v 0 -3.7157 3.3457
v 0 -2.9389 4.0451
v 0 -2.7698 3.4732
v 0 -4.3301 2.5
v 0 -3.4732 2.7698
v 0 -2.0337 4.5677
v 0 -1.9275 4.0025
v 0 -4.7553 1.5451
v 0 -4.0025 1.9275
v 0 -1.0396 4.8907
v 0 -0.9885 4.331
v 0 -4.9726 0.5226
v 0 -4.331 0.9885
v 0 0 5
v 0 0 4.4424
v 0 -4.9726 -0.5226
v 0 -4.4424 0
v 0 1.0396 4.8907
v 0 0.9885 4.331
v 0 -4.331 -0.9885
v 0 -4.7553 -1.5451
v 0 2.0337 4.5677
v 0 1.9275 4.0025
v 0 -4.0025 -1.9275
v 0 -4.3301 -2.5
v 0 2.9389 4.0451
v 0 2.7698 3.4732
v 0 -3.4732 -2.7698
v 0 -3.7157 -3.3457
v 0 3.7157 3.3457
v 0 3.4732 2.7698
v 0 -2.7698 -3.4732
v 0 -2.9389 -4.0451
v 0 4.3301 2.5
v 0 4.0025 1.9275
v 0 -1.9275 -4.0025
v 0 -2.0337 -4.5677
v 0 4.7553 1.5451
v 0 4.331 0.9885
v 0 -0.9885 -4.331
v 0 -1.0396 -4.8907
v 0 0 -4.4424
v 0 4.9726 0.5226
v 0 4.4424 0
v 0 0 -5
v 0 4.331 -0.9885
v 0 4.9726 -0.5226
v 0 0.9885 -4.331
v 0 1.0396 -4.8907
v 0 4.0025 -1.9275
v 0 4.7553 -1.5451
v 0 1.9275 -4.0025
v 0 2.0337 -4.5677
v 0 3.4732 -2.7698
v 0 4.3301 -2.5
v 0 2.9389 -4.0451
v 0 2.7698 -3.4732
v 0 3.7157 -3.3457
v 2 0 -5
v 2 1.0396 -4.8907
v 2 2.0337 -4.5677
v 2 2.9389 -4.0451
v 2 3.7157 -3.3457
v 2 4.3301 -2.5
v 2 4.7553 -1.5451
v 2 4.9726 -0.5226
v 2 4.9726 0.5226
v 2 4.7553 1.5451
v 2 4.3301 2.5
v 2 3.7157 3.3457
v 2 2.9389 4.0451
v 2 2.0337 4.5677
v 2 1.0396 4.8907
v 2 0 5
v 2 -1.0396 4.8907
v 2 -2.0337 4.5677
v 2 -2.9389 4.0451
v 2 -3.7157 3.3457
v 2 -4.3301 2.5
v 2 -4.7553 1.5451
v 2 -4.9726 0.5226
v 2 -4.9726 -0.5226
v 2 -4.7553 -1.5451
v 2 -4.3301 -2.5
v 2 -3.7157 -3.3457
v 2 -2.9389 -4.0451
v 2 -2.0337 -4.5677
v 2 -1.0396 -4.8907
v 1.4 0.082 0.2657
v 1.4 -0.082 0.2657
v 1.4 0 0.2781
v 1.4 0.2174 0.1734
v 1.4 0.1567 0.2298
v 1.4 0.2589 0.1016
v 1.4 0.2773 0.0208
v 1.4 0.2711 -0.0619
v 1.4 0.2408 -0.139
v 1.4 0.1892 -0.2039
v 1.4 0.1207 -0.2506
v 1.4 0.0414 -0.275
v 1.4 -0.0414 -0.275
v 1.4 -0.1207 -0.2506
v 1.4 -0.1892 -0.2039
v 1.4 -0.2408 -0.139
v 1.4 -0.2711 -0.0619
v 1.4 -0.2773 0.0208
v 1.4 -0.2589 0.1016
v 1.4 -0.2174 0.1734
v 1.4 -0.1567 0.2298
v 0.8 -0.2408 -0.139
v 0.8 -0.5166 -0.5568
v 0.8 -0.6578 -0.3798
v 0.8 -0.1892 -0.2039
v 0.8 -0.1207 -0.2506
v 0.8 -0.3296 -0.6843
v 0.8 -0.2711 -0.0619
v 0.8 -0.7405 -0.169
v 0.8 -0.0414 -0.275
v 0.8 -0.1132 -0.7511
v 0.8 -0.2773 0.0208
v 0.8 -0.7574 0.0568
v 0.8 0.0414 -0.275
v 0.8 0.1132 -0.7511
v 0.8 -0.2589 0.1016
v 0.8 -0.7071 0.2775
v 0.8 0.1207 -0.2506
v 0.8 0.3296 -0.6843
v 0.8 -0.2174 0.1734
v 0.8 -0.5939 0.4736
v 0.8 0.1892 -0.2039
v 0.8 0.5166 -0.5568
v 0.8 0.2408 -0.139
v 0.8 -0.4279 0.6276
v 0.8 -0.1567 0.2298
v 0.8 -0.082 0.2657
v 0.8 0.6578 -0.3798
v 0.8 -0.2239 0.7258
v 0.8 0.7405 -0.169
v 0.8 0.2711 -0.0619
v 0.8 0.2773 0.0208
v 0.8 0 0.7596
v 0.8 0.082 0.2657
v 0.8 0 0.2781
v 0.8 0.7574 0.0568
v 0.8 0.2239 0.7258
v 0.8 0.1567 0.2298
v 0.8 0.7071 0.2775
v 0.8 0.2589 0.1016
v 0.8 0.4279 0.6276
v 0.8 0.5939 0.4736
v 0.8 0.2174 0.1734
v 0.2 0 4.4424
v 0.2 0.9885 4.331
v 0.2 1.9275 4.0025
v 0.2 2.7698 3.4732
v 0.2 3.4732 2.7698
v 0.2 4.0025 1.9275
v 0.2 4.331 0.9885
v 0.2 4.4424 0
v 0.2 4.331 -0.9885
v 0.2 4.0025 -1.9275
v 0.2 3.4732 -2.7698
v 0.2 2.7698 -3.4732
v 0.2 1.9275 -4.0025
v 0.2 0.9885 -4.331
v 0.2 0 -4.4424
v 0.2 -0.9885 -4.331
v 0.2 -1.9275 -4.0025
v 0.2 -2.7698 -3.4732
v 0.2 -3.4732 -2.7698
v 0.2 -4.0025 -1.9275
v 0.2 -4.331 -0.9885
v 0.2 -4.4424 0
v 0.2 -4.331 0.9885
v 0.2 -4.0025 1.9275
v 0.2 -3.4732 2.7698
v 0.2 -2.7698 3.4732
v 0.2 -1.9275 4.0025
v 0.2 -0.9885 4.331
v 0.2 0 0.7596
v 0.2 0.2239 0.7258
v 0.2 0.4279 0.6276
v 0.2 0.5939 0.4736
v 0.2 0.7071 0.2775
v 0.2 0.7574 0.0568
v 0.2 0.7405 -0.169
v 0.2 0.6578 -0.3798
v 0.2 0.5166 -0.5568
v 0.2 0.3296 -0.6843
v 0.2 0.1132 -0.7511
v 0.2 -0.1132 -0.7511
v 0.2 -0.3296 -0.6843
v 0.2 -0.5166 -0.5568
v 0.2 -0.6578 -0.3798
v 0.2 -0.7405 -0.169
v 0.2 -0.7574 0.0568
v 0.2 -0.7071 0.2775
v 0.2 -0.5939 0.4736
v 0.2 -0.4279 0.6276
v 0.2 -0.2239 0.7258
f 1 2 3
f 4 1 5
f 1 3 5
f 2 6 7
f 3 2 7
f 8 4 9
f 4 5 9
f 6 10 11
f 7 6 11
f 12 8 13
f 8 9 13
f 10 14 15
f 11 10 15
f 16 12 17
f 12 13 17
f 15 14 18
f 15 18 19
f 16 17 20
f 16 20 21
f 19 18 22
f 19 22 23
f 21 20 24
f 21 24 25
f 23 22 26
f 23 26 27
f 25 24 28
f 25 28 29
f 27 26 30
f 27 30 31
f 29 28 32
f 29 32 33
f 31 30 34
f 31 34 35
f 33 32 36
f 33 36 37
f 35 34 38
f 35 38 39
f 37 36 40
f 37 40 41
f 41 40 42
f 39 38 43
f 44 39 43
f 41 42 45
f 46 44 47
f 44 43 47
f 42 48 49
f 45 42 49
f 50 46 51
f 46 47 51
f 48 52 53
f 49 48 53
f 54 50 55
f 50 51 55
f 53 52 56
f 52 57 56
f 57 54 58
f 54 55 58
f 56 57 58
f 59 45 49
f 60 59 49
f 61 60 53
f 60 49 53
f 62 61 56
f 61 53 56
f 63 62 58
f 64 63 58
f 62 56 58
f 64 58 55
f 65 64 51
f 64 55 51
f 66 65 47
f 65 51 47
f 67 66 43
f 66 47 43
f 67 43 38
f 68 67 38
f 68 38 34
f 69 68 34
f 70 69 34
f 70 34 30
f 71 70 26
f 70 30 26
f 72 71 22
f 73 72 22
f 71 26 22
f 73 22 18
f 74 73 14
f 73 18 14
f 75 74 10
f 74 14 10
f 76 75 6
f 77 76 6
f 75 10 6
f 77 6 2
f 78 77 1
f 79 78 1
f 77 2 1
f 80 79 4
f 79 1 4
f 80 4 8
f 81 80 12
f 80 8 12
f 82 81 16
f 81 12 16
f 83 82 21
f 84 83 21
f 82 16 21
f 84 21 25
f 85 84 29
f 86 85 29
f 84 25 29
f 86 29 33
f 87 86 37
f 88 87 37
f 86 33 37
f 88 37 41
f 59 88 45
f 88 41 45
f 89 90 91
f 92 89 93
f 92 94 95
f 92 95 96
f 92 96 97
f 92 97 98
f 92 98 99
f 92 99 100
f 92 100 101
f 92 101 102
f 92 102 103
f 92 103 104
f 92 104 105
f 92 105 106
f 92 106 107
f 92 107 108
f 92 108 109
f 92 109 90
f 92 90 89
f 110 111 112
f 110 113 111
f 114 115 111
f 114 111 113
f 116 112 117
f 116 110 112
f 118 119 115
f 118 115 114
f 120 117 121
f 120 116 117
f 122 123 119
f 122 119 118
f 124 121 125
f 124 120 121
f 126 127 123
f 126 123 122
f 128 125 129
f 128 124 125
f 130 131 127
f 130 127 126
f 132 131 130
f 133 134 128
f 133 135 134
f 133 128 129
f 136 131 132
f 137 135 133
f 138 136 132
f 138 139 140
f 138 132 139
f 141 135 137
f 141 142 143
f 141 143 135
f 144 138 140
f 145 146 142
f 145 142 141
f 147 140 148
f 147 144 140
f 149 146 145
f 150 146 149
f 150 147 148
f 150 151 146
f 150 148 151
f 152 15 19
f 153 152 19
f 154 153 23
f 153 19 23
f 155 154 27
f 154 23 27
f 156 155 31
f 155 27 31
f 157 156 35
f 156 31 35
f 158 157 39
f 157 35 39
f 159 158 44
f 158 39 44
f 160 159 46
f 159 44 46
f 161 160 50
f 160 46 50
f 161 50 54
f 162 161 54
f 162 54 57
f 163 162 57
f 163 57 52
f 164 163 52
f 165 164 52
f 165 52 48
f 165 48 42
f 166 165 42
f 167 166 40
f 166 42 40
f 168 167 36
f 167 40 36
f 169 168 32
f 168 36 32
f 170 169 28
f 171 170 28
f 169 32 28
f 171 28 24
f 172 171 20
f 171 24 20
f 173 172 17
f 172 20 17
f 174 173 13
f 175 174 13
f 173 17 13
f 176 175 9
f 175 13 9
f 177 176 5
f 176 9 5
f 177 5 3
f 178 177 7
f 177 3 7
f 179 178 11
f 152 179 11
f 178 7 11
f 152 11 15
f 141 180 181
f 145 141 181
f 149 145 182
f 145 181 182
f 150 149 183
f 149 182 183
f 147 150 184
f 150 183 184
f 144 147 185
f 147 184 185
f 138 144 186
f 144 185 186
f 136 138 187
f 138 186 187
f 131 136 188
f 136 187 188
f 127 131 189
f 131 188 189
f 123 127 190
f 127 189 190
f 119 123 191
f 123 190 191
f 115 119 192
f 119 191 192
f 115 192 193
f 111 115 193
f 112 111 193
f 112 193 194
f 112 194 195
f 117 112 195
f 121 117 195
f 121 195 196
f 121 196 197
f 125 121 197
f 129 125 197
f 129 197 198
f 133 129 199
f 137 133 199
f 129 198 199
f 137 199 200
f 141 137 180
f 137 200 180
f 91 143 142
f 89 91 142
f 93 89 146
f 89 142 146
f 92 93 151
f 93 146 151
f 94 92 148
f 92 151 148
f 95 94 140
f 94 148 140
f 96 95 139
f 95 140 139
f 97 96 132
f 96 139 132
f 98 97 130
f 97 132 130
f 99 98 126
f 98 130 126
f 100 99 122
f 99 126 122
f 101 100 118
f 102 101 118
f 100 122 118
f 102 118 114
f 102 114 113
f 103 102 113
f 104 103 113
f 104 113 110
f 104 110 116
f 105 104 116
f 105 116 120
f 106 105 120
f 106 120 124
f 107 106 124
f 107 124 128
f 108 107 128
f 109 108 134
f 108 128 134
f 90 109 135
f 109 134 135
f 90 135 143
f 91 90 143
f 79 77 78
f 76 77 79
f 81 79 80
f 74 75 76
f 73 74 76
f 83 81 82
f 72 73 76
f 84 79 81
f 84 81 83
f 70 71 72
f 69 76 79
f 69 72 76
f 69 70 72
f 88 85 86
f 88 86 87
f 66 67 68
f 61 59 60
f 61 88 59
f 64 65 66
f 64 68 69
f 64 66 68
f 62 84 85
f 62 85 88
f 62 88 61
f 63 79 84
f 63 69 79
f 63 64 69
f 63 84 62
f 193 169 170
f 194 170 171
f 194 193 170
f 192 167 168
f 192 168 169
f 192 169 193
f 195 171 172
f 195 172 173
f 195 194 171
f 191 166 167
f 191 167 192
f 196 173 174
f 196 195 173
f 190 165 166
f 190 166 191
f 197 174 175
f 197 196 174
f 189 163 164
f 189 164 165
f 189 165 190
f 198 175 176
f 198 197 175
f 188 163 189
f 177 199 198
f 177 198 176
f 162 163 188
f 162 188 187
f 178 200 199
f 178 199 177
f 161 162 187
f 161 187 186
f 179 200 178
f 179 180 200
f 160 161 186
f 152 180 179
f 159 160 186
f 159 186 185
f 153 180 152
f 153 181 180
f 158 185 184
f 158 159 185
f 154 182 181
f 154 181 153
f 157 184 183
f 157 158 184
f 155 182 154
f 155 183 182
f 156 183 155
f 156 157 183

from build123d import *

# Parameters (mm, degrees)
SKETCH_1_R          = 5
EXTRUDE_301_DEPTH   = 2
SKETCH_9_R          = 4.442422665
CUT_EXTRUDE_2_DEPTH = 0.2
SKETCH_10_R         = 0.75956549
CUT_EXTRUDE_3_DEPTH = 0.6
SKETCH_11_R         = 0.278093265
CUT_EXTRUDE_4_DEPTH = 0.6


with BuildPart() as part:
    # 草图1 → Extrude 301 (new body)
    with BuildSketch(Plane(origin=(0, 0, 0), x_dir=(0, 0, -1), z_dir=(1, 0, 0))):
        Circle(SKETCH_1_R)
    extrude(amount=EXTRUDE_301_DEPTH)

    # 草图9 → 切除-拉伸2 (cut)
    with BuildSketch(Plane.ZY):
        Circle(SKETCH_9_R)
    extrude(amount=-CUT_EXTRUDE_2_DEPTH, mode=Mode.SUBTRACT)

    # 草图10 → 切除-拉伸3 (cut)
    with BuildSketch(Plane.ZY.offset(-0.2)):
        Circle(SKETCH_10_R)
    extrude(amount=-CUT_EXTRUDE_3_DEPTH, mode=Mode.SUBTRACT)

    # 草图11 → 切除-拉伸4 (cut)
    with BuildSketch(Plane.ZY.offset(-0.8)):
        Circle(SKETCH_11_R)
    extrude(amount=-CUT_EXTRUDE_4_DEPTH, mode=Mode.SUBTRACT)


solid = part.part
